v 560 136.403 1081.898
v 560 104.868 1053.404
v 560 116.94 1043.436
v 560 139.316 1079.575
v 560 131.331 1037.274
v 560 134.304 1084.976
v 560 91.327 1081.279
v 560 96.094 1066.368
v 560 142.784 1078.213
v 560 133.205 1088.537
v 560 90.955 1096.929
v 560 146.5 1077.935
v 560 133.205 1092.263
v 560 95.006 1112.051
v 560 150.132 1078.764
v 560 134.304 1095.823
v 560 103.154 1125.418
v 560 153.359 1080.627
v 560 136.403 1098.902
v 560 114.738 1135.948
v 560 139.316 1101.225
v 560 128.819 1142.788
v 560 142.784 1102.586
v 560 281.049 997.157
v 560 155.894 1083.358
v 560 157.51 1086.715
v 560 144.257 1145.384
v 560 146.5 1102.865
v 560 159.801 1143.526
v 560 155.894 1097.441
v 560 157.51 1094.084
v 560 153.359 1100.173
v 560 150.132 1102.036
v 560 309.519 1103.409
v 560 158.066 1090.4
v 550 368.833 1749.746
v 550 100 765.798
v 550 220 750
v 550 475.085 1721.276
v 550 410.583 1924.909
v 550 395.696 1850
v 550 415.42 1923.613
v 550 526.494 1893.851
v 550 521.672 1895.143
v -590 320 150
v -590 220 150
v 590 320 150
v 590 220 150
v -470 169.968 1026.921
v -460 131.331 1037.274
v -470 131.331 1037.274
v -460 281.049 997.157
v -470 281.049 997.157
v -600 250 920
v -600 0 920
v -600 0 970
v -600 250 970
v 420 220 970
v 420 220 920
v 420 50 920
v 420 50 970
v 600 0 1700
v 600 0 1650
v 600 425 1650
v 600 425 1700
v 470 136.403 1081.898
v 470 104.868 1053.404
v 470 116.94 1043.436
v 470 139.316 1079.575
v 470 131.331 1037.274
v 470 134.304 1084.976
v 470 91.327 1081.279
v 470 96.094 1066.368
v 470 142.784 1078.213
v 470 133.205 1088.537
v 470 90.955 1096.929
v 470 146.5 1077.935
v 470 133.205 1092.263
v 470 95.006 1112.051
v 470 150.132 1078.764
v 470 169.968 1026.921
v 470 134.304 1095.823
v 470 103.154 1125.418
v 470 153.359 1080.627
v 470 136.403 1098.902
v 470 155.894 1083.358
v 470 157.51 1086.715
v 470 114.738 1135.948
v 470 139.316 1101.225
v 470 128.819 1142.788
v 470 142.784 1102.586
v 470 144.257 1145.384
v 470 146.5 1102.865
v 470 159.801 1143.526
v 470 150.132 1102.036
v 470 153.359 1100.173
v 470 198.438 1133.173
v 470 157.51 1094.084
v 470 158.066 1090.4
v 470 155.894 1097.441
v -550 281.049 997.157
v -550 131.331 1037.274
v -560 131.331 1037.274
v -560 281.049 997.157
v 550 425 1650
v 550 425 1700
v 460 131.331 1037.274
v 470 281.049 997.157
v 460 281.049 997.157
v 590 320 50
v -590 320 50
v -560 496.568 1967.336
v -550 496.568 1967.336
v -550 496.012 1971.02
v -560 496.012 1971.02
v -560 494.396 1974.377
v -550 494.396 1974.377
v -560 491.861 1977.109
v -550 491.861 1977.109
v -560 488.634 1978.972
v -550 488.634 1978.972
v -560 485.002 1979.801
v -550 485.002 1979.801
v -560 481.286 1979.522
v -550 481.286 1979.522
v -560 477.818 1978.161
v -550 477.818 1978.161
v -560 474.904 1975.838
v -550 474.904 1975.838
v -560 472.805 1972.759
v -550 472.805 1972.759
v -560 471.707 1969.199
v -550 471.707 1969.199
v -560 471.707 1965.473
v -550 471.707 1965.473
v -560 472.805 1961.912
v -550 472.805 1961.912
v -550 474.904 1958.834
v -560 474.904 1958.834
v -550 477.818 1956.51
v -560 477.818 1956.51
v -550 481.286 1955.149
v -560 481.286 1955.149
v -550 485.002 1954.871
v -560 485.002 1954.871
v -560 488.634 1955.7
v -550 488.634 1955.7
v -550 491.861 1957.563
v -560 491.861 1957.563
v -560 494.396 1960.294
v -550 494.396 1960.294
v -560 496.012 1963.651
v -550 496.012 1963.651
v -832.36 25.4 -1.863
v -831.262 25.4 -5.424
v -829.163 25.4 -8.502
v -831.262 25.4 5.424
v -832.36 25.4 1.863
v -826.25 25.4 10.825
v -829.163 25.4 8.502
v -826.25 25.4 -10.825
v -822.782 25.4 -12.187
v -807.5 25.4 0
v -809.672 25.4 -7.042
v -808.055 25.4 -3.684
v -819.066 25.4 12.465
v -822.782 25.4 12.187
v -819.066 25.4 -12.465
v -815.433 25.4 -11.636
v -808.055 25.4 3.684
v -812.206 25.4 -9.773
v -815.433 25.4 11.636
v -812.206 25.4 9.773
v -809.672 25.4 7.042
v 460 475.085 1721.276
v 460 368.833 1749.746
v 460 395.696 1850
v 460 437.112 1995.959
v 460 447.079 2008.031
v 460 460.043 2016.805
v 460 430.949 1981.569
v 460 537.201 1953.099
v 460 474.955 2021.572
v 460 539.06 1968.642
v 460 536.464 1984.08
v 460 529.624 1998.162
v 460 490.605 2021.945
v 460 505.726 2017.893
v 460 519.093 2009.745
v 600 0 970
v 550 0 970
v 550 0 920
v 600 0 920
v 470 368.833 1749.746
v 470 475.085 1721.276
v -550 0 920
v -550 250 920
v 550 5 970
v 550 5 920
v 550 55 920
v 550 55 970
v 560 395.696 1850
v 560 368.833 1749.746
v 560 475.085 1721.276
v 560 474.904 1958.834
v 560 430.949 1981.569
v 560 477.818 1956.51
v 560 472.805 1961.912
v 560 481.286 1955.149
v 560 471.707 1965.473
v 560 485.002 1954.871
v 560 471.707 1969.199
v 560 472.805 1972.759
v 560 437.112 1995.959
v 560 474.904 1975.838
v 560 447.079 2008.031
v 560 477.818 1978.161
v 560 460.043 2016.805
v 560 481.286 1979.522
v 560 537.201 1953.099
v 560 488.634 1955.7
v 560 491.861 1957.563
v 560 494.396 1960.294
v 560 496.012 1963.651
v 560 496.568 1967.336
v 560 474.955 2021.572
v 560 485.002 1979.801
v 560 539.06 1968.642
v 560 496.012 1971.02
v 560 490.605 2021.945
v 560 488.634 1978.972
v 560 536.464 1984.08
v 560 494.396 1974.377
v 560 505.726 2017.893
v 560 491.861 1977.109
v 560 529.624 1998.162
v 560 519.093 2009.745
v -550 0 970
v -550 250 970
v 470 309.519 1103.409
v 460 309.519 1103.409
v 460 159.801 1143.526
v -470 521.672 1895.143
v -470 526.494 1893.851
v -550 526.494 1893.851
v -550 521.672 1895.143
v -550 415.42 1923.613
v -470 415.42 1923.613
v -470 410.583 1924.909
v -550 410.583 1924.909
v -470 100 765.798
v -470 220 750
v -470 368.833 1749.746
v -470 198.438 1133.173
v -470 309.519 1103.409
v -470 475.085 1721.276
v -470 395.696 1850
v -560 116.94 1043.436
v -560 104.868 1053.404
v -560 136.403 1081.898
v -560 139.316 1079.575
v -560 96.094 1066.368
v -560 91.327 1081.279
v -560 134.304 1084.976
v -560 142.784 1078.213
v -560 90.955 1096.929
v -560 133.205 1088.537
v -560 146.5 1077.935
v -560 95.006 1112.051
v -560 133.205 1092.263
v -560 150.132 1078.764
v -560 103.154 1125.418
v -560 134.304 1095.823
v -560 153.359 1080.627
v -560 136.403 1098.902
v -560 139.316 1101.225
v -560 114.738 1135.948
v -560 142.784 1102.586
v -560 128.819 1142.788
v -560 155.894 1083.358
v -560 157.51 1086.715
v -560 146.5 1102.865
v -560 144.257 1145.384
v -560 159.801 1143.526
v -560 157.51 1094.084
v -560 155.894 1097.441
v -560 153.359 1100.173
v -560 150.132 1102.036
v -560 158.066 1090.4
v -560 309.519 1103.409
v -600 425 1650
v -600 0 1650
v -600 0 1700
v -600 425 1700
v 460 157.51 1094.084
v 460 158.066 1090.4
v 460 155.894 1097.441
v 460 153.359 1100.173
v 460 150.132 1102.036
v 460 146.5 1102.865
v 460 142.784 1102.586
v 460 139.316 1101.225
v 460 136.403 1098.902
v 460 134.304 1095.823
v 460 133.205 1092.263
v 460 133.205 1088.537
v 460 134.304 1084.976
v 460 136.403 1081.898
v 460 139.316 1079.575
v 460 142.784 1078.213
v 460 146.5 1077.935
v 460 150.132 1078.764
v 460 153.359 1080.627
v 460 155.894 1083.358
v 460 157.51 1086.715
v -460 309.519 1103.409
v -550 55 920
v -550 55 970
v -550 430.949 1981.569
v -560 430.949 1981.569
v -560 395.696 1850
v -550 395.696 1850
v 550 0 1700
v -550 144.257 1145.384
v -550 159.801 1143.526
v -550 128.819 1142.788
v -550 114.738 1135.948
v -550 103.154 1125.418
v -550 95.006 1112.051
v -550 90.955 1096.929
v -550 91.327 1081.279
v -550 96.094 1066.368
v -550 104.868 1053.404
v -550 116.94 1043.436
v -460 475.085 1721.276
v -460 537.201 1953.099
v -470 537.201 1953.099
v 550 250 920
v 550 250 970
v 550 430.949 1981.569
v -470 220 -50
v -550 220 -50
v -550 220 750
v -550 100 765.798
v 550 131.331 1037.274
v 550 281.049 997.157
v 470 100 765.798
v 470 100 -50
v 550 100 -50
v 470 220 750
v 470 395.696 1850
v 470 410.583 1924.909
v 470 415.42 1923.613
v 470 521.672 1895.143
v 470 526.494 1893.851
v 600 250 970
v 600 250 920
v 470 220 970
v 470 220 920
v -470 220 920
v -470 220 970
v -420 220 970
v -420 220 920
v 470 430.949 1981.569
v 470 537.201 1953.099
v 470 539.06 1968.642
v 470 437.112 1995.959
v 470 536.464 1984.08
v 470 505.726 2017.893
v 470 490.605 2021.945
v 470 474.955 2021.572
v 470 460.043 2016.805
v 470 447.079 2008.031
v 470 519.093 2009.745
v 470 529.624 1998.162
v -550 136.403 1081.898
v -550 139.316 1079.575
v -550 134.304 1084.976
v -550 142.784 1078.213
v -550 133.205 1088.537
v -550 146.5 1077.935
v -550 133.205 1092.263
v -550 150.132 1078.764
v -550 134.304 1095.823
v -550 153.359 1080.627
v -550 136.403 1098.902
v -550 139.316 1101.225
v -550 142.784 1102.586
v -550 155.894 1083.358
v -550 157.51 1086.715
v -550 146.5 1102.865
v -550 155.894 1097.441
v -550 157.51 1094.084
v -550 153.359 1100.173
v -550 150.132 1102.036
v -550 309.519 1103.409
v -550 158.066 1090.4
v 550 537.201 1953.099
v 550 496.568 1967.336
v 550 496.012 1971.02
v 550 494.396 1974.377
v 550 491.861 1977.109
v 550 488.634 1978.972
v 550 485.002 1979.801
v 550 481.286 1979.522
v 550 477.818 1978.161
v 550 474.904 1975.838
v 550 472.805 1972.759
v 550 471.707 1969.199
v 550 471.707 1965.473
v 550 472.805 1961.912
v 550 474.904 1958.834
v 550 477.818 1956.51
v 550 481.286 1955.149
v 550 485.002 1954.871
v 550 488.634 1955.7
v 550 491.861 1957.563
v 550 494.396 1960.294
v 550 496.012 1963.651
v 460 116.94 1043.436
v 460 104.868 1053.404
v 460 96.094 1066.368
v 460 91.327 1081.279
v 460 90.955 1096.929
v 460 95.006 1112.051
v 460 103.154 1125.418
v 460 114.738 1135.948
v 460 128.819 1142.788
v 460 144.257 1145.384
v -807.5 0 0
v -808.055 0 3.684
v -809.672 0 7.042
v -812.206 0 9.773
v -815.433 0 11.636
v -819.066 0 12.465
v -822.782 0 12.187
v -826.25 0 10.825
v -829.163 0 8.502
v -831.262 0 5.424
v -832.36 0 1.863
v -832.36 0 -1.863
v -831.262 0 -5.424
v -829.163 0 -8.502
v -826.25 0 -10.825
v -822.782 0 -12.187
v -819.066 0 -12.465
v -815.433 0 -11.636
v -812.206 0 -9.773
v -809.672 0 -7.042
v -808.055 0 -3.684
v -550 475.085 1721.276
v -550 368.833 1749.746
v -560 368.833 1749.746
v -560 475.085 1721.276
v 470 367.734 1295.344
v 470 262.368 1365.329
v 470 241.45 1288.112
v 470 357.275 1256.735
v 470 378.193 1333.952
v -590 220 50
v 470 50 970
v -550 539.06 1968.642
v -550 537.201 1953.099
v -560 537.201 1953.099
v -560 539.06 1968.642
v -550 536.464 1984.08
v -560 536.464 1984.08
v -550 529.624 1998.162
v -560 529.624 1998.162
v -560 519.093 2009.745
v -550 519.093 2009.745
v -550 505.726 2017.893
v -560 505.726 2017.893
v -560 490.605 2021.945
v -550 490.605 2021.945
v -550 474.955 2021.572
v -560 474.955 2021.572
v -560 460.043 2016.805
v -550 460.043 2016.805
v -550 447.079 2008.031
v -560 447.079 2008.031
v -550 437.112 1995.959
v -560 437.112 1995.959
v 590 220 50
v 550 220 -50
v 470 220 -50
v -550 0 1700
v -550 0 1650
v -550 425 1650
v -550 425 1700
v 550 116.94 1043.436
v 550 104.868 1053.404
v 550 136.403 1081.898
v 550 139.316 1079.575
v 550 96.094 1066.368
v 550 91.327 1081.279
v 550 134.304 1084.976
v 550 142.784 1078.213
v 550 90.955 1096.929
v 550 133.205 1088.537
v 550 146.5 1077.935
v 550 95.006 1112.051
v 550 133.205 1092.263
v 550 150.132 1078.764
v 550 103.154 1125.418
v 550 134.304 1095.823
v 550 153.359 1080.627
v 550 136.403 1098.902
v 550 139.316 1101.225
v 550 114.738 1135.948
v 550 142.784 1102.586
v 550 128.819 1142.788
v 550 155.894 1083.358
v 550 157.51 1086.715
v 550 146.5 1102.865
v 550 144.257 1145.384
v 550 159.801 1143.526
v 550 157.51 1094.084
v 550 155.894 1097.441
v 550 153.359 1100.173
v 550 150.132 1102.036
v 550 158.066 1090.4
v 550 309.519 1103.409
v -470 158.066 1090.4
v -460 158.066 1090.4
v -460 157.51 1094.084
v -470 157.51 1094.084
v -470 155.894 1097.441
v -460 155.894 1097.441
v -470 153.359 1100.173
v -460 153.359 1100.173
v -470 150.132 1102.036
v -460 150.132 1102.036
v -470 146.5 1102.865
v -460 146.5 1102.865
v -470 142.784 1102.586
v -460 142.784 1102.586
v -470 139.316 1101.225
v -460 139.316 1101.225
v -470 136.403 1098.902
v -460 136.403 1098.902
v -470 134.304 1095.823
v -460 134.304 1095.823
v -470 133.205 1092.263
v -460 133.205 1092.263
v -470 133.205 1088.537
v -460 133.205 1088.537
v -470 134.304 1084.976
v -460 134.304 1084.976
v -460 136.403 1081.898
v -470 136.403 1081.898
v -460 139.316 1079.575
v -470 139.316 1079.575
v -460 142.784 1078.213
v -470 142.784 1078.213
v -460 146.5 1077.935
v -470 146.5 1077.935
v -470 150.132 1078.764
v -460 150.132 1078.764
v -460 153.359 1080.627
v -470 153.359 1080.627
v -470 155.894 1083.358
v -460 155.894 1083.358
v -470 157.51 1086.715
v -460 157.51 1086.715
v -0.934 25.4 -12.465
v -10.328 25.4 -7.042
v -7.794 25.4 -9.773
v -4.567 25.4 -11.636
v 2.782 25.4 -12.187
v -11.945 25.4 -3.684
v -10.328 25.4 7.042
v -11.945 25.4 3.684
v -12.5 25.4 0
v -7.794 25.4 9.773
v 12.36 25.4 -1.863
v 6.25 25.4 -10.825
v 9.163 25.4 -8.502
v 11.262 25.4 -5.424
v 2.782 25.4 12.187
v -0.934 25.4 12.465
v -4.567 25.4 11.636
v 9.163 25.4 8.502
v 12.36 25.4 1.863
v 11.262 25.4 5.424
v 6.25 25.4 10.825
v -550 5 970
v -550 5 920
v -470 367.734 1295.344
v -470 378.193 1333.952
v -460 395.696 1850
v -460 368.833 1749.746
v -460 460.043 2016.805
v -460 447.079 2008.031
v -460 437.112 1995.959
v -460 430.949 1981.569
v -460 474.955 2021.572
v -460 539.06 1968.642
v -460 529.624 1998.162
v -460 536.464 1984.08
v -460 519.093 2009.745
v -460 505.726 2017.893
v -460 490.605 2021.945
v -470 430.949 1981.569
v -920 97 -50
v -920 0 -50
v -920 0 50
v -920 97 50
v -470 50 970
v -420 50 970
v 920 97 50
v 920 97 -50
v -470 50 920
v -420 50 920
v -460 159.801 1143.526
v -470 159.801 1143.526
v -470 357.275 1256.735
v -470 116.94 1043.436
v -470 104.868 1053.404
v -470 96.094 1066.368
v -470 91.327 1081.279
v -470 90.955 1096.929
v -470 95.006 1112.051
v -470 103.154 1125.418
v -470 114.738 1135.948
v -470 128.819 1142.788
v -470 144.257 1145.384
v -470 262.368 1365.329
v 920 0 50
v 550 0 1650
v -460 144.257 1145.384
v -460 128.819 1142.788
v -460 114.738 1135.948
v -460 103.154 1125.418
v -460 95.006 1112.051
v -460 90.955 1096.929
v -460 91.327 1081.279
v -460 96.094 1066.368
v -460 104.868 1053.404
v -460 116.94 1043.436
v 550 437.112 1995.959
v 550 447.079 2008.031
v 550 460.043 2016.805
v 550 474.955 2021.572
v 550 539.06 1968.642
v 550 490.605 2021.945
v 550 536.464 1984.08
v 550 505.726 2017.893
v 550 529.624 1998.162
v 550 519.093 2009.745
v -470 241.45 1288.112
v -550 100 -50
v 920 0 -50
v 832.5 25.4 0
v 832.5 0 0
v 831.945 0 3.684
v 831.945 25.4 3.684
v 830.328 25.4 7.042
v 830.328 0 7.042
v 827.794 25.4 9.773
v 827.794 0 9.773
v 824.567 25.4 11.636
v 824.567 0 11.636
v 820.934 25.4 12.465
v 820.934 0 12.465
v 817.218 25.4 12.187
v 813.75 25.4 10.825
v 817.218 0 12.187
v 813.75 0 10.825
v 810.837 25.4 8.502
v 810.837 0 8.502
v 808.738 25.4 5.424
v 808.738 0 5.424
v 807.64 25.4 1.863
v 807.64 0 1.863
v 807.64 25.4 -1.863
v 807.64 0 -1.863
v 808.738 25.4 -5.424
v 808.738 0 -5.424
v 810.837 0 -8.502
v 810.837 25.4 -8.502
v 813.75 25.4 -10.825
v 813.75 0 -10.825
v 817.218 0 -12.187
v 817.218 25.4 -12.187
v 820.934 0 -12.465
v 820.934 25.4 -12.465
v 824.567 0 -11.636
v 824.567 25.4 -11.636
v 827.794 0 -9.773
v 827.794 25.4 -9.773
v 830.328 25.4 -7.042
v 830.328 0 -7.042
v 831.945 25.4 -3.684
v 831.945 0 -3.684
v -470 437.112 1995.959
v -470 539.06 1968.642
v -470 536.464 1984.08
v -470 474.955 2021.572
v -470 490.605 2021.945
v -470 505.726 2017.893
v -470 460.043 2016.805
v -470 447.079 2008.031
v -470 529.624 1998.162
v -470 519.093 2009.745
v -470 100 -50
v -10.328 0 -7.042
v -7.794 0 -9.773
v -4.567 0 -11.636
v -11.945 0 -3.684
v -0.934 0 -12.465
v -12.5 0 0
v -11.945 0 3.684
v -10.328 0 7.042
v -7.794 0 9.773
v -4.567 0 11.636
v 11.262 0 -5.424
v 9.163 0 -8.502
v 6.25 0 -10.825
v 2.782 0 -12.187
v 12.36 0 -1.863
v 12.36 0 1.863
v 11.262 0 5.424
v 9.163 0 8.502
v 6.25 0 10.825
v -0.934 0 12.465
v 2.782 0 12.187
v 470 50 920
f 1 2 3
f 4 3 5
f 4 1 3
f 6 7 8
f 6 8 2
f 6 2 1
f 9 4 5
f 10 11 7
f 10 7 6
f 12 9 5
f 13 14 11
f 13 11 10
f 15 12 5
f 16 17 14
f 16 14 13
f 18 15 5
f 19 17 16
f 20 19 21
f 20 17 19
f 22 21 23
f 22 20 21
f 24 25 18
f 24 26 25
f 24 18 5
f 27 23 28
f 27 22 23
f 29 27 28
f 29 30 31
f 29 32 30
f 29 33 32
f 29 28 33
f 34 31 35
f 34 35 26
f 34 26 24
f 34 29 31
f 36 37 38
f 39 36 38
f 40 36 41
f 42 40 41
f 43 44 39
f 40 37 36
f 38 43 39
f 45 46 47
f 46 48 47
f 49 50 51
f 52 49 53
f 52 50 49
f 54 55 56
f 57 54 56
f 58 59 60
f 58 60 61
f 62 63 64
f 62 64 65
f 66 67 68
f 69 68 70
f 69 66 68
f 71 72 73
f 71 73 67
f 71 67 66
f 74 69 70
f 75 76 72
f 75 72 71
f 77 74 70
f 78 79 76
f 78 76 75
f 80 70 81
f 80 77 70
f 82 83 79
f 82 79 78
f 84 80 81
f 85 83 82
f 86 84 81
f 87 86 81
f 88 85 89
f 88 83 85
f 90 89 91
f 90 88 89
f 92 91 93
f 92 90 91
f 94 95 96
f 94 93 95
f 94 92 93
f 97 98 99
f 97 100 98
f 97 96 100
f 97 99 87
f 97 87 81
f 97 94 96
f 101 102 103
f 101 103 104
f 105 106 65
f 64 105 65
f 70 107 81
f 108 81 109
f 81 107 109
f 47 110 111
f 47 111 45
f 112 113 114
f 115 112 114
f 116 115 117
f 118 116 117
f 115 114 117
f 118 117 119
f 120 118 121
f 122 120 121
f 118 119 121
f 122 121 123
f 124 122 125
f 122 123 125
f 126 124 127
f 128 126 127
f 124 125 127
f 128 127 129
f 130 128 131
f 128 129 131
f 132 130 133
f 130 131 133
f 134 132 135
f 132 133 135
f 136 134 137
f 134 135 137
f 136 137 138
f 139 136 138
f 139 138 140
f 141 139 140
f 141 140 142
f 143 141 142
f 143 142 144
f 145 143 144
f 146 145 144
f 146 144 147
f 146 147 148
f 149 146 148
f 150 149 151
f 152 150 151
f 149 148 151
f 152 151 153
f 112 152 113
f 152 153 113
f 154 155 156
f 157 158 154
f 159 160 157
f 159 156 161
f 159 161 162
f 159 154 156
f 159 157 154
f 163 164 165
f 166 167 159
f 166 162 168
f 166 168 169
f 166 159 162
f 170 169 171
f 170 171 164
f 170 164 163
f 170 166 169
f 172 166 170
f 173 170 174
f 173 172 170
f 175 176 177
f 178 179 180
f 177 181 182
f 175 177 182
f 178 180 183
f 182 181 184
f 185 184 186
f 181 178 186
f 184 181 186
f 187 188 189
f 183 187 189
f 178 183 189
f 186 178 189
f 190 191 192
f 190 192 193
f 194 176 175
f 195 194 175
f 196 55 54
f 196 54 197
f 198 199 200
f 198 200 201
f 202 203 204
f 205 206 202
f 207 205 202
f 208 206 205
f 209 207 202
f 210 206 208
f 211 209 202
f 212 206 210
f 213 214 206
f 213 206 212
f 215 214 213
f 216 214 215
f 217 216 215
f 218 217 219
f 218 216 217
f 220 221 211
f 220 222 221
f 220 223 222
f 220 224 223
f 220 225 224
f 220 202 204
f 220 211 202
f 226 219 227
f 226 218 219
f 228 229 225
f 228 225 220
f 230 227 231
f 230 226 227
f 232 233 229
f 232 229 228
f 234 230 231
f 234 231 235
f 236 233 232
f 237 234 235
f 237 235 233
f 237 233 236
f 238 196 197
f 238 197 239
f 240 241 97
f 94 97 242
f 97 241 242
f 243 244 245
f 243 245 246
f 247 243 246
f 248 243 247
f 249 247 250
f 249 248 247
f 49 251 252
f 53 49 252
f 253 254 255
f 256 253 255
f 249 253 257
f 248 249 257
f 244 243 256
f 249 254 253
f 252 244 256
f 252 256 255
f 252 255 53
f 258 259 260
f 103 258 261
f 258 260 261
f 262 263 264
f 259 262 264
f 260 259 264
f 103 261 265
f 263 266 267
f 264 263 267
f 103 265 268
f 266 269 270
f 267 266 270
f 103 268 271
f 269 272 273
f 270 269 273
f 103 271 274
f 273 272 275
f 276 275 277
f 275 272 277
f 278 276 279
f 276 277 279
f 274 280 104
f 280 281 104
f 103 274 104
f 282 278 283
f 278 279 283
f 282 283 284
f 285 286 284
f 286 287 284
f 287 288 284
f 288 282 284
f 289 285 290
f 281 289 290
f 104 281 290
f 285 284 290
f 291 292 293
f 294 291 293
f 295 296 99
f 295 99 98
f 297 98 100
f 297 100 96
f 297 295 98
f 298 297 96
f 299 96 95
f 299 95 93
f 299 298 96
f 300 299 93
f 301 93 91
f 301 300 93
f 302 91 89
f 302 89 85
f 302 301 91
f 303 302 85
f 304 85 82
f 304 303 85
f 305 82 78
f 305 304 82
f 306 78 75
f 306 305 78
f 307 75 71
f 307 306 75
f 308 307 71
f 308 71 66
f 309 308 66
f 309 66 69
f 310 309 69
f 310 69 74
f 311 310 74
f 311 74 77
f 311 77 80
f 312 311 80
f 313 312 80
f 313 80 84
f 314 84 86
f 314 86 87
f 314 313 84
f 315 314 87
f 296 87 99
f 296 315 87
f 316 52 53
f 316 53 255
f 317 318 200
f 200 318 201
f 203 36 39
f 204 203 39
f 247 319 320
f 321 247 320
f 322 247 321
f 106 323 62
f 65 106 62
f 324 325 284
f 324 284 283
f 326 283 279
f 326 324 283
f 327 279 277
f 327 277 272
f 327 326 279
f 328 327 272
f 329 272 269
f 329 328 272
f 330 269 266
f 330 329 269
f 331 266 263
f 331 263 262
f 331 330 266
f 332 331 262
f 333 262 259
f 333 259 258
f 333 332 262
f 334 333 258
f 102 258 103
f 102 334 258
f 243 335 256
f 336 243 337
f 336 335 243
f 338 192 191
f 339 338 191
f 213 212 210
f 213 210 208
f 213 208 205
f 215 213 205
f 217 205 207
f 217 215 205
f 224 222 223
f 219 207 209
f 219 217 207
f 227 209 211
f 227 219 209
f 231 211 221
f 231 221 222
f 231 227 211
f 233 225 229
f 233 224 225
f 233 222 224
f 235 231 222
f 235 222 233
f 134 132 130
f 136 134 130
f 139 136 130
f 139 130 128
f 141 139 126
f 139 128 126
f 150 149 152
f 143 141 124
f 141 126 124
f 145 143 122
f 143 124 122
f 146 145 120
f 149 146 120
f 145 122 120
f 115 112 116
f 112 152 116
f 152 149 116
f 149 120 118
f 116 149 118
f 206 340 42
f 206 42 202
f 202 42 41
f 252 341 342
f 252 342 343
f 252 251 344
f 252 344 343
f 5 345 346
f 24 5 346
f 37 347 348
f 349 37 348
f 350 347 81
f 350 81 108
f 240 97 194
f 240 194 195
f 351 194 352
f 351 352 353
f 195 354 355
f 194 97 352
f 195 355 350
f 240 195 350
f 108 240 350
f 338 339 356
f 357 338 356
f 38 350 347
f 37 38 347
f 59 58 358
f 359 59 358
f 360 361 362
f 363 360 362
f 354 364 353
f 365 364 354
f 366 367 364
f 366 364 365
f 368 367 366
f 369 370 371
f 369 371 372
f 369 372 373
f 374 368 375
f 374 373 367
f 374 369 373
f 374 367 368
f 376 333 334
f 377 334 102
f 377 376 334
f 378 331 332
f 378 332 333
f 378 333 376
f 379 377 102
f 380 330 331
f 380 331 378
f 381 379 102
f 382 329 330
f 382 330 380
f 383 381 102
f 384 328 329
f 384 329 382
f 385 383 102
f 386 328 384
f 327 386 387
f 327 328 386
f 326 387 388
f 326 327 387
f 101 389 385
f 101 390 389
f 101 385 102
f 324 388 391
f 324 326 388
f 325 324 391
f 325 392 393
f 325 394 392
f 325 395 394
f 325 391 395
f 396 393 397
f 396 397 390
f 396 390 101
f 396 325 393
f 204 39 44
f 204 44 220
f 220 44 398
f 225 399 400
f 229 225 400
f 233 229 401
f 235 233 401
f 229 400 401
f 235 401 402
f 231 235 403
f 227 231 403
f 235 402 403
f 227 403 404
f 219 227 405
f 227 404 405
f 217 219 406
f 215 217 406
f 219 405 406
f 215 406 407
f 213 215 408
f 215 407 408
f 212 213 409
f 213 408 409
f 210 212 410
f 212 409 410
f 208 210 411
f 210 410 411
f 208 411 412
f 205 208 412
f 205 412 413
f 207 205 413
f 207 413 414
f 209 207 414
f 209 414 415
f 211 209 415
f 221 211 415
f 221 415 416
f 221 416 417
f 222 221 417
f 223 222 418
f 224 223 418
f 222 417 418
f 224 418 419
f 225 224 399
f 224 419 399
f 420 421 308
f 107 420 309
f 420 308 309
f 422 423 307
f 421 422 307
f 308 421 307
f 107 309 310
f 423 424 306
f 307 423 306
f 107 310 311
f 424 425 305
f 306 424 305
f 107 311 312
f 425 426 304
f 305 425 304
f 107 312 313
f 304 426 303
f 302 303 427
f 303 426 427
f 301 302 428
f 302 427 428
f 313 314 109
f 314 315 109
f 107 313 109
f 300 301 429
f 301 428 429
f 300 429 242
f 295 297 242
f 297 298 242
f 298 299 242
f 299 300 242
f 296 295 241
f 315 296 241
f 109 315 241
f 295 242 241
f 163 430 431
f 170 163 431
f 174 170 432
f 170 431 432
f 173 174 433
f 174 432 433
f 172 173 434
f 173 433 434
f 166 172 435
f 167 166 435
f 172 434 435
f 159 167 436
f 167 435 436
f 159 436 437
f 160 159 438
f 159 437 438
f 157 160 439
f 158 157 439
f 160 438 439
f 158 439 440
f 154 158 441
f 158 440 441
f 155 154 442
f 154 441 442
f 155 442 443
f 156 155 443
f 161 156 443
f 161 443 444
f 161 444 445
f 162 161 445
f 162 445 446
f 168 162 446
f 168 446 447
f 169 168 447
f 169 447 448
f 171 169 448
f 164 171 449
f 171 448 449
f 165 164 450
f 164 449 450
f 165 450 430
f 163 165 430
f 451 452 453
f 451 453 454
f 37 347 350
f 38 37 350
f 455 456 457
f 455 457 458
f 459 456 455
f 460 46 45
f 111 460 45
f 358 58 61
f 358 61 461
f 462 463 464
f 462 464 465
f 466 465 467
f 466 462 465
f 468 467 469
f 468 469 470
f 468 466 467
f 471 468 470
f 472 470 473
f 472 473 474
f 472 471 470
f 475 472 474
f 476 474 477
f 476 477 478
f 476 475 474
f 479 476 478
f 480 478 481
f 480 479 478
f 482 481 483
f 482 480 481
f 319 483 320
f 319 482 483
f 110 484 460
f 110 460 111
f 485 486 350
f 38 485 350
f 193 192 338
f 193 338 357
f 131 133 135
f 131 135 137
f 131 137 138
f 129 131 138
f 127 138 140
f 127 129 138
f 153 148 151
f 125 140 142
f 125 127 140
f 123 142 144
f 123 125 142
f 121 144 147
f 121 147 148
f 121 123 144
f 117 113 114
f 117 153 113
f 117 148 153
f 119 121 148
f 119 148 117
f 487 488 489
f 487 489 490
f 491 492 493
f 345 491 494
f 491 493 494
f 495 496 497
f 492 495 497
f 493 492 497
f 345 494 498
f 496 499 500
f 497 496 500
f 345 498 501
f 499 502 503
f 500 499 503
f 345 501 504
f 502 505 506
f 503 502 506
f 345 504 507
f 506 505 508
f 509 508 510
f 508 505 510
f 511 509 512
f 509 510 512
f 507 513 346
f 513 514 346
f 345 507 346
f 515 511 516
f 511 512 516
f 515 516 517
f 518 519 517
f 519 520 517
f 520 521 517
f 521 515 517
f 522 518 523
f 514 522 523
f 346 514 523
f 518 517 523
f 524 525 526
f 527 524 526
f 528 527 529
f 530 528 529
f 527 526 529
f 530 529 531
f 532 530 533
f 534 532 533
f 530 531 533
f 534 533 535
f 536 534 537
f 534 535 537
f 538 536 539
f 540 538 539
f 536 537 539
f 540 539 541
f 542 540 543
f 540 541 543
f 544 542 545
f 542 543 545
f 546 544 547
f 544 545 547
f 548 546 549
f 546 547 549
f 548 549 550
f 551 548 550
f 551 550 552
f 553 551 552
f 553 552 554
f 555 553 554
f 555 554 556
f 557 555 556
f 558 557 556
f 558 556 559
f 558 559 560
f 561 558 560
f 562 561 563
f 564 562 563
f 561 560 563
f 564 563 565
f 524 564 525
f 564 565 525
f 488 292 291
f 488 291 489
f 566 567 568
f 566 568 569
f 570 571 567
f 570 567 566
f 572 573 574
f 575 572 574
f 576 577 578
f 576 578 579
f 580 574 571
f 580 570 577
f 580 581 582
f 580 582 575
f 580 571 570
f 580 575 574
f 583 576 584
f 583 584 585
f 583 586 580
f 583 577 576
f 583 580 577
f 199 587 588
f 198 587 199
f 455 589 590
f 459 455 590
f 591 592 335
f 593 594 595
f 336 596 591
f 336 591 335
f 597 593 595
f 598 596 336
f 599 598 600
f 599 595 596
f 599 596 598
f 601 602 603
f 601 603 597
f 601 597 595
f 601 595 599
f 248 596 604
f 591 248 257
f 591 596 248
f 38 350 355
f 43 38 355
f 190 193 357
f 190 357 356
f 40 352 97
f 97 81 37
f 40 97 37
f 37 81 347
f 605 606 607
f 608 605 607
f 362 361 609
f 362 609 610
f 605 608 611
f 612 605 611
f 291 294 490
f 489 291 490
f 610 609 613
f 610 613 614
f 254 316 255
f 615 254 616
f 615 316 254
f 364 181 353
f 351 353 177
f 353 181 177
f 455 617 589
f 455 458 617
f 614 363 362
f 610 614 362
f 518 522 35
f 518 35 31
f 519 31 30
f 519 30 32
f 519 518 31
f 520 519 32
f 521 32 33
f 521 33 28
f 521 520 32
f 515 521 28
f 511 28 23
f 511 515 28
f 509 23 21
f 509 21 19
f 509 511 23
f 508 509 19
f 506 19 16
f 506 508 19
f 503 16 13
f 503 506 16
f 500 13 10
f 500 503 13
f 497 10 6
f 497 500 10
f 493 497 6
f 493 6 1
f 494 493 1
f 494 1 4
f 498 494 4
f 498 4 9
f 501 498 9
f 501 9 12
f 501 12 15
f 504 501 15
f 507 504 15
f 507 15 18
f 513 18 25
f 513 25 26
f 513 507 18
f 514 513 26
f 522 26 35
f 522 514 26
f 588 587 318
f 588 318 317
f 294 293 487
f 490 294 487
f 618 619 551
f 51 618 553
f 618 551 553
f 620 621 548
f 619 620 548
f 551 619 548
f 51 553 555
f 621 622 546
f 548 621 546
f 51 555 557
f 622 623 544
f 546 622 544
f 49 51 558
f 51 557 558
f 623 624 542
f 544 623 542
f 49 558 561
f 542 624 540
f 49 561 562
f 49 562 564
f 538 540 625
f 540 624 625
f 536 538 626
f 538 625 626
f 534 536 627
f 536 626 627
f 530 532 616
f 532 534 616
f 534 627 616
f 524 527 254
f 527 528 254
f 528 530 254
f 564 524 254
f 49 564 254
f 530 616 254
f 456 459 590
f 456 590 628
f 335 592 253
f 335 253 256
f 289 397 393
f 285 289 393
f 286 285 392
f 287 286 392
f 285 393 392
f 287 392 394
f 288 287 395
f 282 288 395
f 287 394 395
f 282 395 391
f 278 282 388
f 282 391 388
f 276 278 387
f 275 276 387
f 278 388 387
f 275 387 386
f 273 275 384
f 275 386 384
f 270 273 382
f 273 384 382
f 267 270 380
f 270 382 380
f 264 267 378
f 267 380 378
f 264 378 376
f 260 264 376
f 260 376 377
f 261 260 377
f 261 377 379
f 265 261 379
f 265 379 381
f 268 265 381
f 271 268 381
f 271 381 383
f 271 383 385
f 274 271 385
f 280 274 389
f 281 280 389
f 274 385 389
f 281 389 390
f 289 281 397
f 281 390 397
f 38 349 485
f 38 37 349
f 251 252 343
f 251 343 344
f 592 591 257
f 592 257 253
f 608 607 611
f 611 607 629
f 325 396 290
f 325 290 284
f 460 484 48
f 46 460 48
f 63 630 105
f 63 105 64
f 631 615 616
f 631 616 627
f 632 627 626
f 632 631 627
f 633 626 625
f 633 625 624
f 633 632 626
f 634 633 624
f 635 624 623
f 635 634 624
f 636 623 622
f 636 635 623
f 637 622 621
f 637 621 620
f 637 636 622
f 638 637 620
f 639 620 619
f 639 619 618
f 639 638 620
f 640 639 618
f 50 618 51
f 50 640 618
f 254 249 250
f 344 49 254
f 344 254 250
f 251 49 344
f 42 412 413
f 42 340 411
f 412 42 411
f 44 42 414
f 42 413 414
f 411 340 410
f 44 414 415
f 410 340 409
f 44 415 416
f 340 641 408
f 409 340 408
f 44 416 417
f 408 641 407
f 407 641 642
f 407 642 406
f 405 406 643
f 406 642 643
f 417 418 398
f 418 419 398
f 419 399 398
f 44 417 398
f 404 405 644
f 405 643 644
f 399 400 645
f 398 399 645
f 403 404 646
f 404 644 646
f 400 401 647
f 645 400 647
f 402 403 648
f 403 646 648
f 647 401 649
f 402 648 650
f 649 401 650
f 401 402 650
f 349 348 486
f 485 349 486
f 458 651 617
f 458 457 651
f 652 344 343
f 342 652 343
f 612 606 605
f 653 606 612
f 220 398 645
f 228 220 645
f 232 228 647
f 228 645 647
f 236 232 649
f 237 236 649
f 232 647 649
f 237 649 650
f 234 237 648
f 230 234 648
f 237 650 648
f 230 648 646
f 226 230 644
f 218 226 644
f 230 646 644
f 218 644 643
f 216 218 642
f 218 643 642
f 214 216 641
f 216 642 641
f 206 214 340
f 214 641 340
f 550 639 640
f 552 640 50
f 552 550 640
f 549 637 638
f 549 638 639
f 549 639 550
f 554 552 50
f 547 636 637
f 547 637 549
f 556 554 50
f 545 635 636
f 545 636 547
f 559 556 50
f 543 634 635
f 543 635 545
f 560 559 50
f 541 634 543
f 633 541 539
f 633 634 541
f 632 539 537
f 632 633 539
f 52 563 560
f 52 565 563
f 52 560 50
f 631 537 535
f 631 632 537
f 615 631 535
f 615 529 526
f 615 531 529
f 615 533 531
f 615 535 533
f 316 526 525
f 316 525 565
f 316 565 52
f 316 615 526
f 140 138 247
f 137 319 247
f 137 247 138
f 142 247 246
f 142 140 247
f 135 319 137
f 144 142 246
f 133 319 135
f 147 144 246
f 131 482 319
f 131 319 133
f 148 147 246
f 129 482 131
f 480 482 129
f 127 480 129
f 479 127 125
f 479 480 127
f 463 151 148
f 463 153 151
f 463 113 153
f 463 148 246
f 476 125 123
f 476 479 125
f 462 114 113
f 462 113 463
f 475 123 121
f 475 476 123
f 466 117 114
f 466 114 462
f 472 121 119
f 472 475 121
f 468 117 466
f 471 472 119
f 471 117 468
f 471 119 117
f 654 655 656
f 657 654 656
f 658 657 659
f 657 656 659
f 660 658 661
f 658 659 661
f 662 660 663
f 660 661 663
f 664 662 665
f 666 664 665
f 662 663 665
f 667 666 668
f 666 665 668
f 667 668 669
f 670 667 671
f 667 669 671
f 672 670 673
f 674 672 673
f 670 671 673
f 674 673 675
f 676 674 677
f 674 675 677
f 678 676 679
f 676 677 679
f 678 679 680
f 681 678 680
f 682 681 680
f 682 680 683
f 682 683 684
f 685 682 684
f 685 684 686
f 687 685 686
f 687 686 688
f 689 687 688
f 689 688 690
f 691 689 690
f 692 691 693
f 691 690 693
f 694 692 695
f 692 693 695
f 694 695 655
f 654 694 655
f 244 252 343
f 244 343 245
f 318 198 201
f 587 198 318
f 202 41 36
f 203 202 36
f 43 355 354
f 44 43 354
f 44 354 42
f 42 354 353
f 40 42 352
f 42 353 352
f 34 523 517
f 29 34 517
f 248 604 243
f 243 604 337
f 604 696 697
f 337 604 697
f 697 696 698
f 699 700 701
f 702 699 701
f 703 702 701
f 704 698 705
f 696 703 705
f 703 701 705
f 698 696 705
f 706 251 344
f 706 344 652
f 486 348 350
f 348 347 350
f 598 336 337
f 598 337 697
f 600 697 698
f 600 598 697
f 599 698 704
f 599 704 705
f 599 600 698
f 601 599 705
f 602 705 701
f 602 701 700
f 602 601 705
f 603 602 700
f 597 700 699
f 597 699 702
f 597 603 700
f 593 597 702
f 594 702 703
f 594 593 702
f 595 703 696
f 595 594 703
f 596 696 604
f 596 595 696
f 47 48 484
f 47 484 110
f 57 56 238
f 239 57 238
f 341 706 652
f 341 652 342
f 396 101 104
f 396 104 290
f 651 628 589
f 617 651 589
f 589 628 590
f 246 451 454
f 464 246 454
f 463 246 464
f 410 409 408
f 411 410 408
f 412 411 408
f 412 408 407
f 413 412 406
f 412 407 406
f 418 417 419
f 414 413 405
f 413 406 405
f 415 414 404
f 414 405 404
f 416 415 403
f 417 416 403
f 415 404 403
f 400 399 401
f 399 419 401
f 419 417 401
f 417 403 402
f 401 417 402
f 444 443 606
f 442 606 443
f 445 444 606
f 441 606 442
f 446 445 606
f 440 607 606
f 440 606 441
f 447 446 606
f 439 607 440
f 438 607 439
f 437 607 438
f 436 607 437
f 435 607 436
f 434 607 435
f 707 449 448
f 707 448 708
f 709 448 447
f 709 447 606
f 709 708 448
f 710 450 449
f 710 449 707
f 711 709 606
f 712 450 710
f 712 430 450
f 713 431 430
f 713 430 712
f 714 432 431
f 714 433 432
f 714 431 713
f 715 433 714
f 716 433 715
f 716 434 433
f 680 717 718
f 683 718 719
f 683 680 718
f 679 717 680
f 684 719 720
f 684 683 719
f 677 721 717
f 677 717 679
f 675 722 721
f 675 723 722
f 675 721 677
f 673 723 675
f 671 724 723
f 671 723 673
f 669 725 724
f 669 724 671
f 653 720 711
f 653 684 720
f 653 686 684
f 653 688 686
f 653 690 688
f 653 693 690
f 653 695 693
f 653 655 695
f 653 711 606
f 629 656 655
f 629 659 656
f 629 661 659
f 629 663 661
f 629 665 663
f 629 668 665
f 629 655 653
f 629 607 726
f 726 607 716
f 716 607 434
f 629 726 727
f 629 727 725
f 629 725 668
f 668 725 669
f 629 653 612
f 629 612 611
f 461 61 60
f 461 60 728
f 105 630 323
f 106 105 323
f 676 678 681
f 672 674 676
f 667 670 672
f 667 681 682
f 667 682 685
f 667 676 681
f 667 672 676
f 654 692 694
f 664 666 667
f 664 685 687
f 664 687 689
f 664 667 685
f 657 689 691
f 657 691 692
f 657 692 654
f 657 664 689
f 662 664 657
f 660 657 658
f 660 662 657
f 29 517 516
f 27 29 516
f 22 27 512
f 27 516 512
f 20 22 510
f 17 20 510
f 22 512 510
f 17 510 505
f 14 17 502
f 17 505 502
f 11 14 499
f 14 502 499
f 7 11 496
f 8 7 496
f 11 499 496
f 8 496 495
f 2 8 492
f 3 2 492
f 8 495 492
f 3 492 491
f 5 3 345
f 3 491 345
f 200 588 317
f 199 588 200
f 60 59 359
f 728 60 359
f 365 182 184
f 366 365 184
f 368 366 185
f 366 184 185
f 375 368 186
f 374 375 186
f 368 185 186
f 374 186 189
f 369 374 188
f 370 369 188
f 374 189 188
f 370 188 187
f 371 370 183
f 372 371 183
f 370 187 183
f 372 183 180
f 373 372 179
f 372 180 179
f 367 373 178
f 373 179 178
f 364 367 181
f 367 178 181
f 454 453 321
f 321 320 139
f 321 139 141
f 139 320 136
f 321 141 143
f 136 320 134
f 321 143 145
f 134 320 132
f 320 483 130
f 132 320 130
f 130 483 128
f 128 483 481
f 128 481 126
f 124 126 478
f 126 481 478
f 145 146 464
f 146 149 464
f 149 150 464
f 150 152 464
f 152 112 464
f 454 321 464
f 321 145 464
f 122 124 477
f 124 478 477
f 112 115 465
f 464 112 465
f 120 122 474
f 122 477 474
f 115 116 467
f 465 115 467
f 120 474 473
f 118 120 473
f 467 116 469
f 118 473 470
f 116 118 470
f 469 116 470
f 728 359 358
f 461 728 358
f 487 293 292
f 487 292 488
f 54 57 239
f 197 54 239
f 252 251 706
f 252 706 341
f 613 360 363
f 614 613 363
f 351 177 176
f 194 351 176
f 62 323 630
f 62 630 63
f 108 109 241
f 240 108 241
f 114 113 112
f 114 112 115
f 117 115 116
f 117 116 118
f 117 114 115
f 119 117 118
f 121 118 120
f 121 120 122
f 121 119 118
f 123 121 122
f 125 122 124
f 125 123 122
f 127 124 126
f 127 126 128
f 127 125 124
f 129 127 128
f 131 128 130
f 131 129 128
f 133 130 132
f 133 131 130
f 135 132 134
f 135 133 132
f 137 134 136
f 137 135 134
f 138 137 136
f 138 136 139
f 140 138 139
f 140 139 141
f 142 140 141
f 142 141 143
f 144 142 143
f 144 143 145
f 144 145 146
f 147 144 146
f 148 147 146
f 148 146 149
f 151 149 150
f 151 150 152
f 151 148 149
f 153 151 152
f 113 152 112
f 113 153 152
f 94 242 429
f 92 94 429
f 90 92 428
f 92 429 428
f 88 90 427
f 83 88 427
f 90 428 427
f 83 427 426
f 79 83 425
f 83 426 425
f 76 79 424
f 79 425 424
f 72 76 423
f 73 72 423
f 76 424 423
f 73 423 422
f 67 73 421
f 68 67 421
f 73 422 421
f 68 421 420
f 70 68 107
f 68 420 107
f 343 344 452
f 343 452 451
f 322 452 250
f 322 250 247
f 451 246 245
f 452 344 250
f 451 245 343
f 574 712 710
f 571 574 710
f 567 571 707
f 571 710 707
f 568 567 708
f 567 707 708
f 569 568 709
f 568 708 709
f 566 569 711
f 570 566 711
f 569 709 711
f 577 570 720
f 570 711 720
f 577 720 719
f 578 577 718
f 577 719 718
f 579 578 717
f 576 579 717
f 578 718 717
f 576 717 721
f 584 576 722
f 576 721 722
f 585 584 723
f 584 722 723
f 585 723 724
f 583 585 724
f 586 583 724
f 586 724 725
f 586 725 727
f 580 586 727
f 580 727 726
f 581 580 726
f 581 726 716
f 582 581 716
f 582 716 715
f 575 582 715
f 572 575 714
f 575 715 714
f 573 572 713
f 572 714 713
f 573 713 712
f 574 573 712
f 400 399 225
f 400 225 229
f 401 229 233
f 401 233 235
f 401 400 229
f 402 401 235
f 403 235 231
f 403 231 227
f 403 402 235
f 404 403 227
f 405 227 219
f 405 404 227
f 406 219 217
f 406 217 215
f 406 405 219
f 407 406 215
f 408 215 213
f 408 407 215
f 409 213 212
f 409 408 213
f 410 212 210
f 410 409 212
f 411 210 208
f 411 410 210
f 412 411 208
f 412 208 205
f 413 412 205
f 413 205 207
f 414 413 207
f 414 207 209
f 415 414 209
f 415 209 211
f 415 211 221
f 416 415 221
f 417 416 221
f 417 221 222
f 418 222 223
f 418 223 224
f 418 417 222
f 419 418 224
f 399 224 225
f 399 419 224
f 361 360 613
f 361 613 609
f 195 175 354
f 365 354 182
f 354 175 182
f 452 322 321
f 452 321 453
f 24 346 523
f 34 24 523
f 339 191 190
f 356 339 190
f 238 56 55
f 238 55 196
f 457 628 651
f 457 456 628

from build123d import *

# Parameters (mm, degrees)
F0_W           = 1840
F0_H           = 100
F3_DEPTH       = 97
F4_START       = -5
F4_DEPTH       = 50
F5_R           = 12.5
F6_DEPTH       = 25.4
F7_W           = 50
F7_H           = 50
F8_DEPTH       = 250
F10_START      = -50
F9_W           = 50
F9_H           = 50
F10_DEPTH      = 170
F2_W           = 50
F2_H           = 50
F11_DEPTH      = 425
F13_START      = 470
F13_DEPTH      = 80
F15_START      = -470
F15_DEPTH      = 80
F17_START      = 470
F17_DEPTH      = 80
F18_START      = -470
F18_DEPTH      = 80
F20_START      = 550
F19_R          = 12.5
F20_DEPTH      = 10
F21_START      = 460
F21_DEPTH      = 10
F22_START      = -550
F22_DEPTH      = 10
F23_START      = -460
F23_DEPTH      = 10
F25_W          = 100
F25_H          = 100
F26_DEPTH      = 590
F26_DEPTH_BACK = 590
F27_START      = 550
F24_R          = 12.5
F27_DEPTH      = 10
F28_START      = 460
F28_DEPTH      = 10
F29_START      = -550
F29_DEPTH      = 10
F30_START      = -460
F30_DEPTH      = 10
F32_DEPTH      = 470
F32_DEPTH_BACK = 470


with BuildPart() as f3:
    # F0 (on Front) → F3 (new body)
    with BuildSketch(Plane.XZ):
        Rectangle(F0_W, F0_H)
    extrude(amount=-F3_DEPTH)

    # F5 (on Front) → F6 (cut)
    with BuildSketch(Plane.XZ):
        with Locations((-820, 0)):
            Circle(F5_R)
        with BuildLine():
            ThreePointArc((12.5, 0), (0, 12.5), (-12.5, 0))
            ThreePointArc((-12.5, 0), (0, -12.5), (12.5, 0))
        make_face()
        with Locations((820, 0)):
            Circle(F5_R)
    extrude(amount=-F6_DEPTH, mode=Mode.SUBTRACT)


with BuildPart() as f4:
    # F1 (on Front) → F4 (new body)
    with BuildSketch(Plane.XZ.offset(F4_START)):
        Polygon((550, 970), (-550, 970), (-550, 920), (0, 920), (550, 920), align=None)
    extrude(amount=-F4_DEPTH)


with BuildPart() as f8:
    # F7 (on Front) → F8 (new body)
    with BuildSketch(Plane.XZ):
        with Locations((-575, 945)):
            Rectangle(F7_W, F7_H)
    extrude(amount=-F8_DEPTH)


with BuildPart() as f8b:
    # F7 (on Front) → F8, piece 2 (new body)
    with BuildSketch(Plane.XZ):
        with Locations((575, 945)):
            Rectangle(F7_W, F7_H)
    extrude(amount=-F8_DEPTH)


with BuildPart() as f10:
    # F9 (on Front) → F10 (new body)
    with BuildSketch(Plane.XZ.offset(F10_START)):
        with Locations((-445, 945)):
            Rectangle(F9_W, F9_H)
    extrude(amount=-F10_DEPTH)


with BuildPart() as f10b:
    # F9 (on Front) → F10, piece 2 (new body)
    with BuildSketch(Plane.XZ.offset(F10_START)):
        with Locations((445, 945)):
            Rectangle(F9_W, F9_H)
    extrude(amount=-F10_DEPTH)


with BuildPart() as f11:
    # F2 (on Front) → F11 (new body)
    with BuildSketch(Plane.XZ):
        with Locations((-575, 1675)):
            Rectangle(F2_W, F2_H)
    extrude(amount=-F11_DEPTH)


with BuildPart() as f11b:
    # F2 (on Front) → F11, piece 2 (new body)
    with BuildSketch(Plane.XZ):
        with Locations((575, 1675)):
            Rectangle(F2_W, F2_H)
    extrude(amount=-F11_DEPTH)


with BuildPart() as f13:
    # F12 (on Right) → F13 (new body)
    with BuildSketch(Plane.YZ.offset(F13_START)):
        Polygon((100, 750), (100, 0), (100, -50), (220, -50), (220, 0), (220, 750), (100, 765.7982997105), align=None)
    extrude(amount=F13_DEPTH)


with BuildPart() as f15:
    # F14 (on Right) → F15 (new body)
    with BuildSketch(Plane.YZ.offset(F15_START)):
        Polygon((220, -50), (220, 0), (220, 750), (100, 765.7982997105), (100, 750), (100, 0), (100, -50), align=None)
    extrude(amount=-F15_DEPTH)


with BuildPart() as f17:
    # F16 (on Right) → F17 (new body)
    with BuildSketch(Plane.YZ.offset(F17_START)):
        Polygon((100, 765.7982997105), (220, 750), (526.4939532777, 1893.8510058451), (410.582854123, 1924.9092912574), align=None)
    extrude(amount=F17_DEPTH)

    # F19 (on Right) → F20 (join)
    with BuildSketch(Plane.YZ.offset(F20_START)):
        Polygon((475.0847018168, 1721.2763607837), (521.6721299352, 1895.1430095157), (415.4202890434, 1923.613104477), (395.6957171464, 1850), (368.832860925, 1749.746455745), align=None)
        with BuildLine():
            Line((415.4202890434, 1923.613104477), (521.6721299352, 1895.1430095157))
            Line((521.6721299352, 1895.1430095157), (537.2012726414, 1953.0985590931))
            ThreePointArc((537.2012726414, 1953.0985590931), (498.3103996761, 2020.4595270196), (430.9494317496, 1981.5686540544))
            Line((430.9494317496, 1981.5686540544), (415.4202890434, 1923.613104477))
        make_face()
        with Locations((484.0675464065, 1967.3356981286)):
            Circle(F19_R, mode=Mode.SUBTRACT)
    extrude(amount=F20_DEPTH)

    # F19 (on Right) → F21 (join)
    with BuildSketch(Plane.YZ.offset(F21_START)):
        Polygon((475.0847018168, 1721.2763607837), (521.6721299352, 1895.1430095157), (415.4202890434, 1923.613104477), (395.6957171464, 1850), (368.832860925, 1749.746455745), align=None)
        with BuildLine():
            Line((415.4202890434, 1923.613104477), (521.6721299352, 1895.1430095157))
            Line((521.6721299352, 1895.1430095157), (537.2012726414, 1953.0985590931))
            ThreePointArc((537.2012726414, 1953.0985590931), (498.3103996761, 2020.4595270196), (430.9494317496, 1981.5686540544))
            Line((430.9494317496, 1981.5686540544), (415.4202890434, 1923.613104477))
        make_face()
        with Locations((484.0675464065, 1967.3356981286)):
            Circle(F19_R, mode=Mode.SUBTRACT)
    extrude(amount=F21_DEPTH)

    # F24 (on Right) → F28 (join)
    with BuildSketch(Plane.YZ.offset(F28_START)):
        with Locations((484.0675464065, 1967.3356981286)):
            Circle(F24_R)
        with BuildLine():
            Line((131.330628284, 1037.2739285056), (169.9676613355, 1026.9211667015))
            Line((169.9676613355, 1026.9211667015), (198.4377562968, 1133.1730075933))
            Line((198.4377562968, 1133.1730075933), (159.8007232453, 1143.5257693974))
            ThreePointArc((159.8007232453, 1143.5257693974), (92.4397553187, 1104.6348964321), (131.330628284, 1037.2739285056))
        make_face()
        with Locations((145.5656757646, 1090.3998489515)):
            Circle(F24_R, mode=Mode.SUBTRACT)
        Polygon((198.4377562968, 1133.1730075933), (169.9676613355, 1026.9211667015), (281.0491313588, 997.1569765147), (309.5192263201, 1103.4088174065), align=None)
    extrude(amount=F28_DEPTH)


with BuildPart() as f18:
    # F16 (on Right) → F18 (new body)
    with BuildSketch(Plane.YZ.offset(F18_START)):
        Polygon((100, 765.7982997105), (220, 750), (526.4939532777, 1893.8510058451), (410.582854123, 1924.9092912574), align=None)
    extrude(amount=-F18_DEPTH)

    # F19 (on Right) → F22 (join)
    with BuildSketch(Plane.YZ.offset(F22_START)):
        Polygon((475.0847018168, 1721.2763607837), (521.6721299352, 1895.1430095157), (415.4202890434, 1923.613104477), (395.6957171464, 1850), (368.832860925, 1749.746455745), align=None)
        with BuildLine():
            Line((415.4202890434, 1923.613104477), (521.6721299352, 1895.1430095157))
            Line((521.6721299352, 1895.1430095157), (537.2012726414, 1953.0985590931))
            ThreePointArc((537.2012726414, 1953.0985590931), (498.3103996761, 2020.4595270196), (430.9494317496, 1981.5686540544))
            Line((430.9494317496, 1981.5686540544), (415.4202890434, 1923.613104477))
        make_face()
        with Locations((484.0675464065, 1967.3356981286)):
            Circle(F19_R, mode=Mode.SUBTRACT)
    extrude(amount=-F22_DEPTH)

    # F19 (on Right) → F23 (join)
    with BuildSketch(Plane.YZ.offset(F23_START)):
        Polygon((475.0847018168, 1721.2763607837), (521.6721299352, 1895.1430095157), (415.4202890434, 1923.613104477), (395.6957171464, 1850), (368.832860925, 1749.746455745), align=None)
        with BuildLine():
            Line((415.4202890434, 1923.613104477), (521.6721299352, 1895.1430095157))
            Line((521.6721299352, 1895.1430095157), (537.2012726414, 1953.0985590931))
            ThreePointArc((537.2012726414, 1953.0985590931), (498.3103996761, 2020.4595270196), (430.9494317496, 1981.5686540544))
            Line((430.9494317496, 1981.5686540544), (415.4202890434, 1923.613104477))
        make_face()
        with Locations((484.0675464065, 1967.3356981286)):
            Circle(F19_R, mode=Mode.SUBTRACT)
    extrude(amount=-F23_DEPTH)

    # F24 (on Right) → F30 (join)
    with BuildSketch(Plane.YZ.offset(F30_START)):
        with Locations((484.0675464065, 1967.3356981286)):
            Circle(F24_R)
        with BuildLine():
            Line((131.330628284, 1037.2739285056), (169.9676613355, 1026.9211667015))
            Line((169.9676613355, 1026.9211667015), (198.4377562968, 1133.1730075933))
            Line((198.4377562968, 1133.1730075933), (159.8007232453, 1143.5257693974))
            ThreePointArc((159.8007232453, 1143.5257693974), (92.4397553187, 1104.6348964321), (131.330628284, 1037.2739285056))
        make_face()
        with Locations((145.5656757646, 1090.3998489515)):
            Circle(F24_R, mode=Mode.SUBTRACT)
        Polygon((198.4377562968, 1133.1730075933), (169.9676613355, 1026.9211667015), (281.0491313588, 997.1569765147), (309.5192263201, 1103.4088174065), align=None)
    extrude(amount=-F30_DEPTH)


with BuildPart() as f26:
    # F25 (on Right) → F26 (new body, two sides)
    with BuildSketch(Plane.YZ) as f26_sk:
        with Locations((270, 100)):
            Rectangle(F25_W, F25_H)
    extrude(amount=F26_DEPTH)
    extrude(f26_sk.sketch, amount=-F26_DEPTH_BACK)


with BuildPart() as f27:
    # F24 (on Right) → F27 (new body)
    with BuildSketch(Plane.YZ.offset(F27_START)):
        with Locations((484.0675464065, 1967.3356981286)):
            Circle(F24_R)
    extrude(amount=F27_DEPTH)


with BuildPart() as f27b:
    # F24 (on Right) → F27, piece 2 (new body)
    with BuildSketch(Plane.YZ.offset(F27_START)):
        with BuildLine():
            Line((131.330628284, 1037.2739285056), (169.9676613355, 1026.9211667015))
            Line((169.9676613355, 1026.9211667015), (198.4377562968, 1133.1730075933))
            Line((198.4377562968, 1133.1730075933), (159.8007232453, 1143.5257693974))
            ThreePointArc((159.8007232453, 1143.5257693974), (92.4397553187, 1104.6348964321), (131.330628284, 1037.2739285056))
        make_face()
        with Locations((145.5656757646, 1090.3998489515)):
            Circle(F24_R, mode=Mode.SUBTRACT)
        Polygon((198.4377562968, 1133.1730075933), (169.9676613355, 1026.9211667015), (281.0491313588, 997.1569765147), (309.5192263201, 1103.4088174065), align=None)
    extrude(amount=F27_DEPTH)


with BuildPart() as f29:
    # F24 (on Right) → F29 (new body)
    with BuildSketch(Plane.YZ.offset(F29_START)):
        with Locations((484.0675464065, 1967.3356981286)):
            Circle(F24_R)
    extrude(amount=-F29_DEPTH)


with BuildPart() as f29b:
    # F24 (on Right) → F29, piece 2 (new body)
    with BuildSketch(Plane.YZ.offset(F29_START)):
        with BuildLine():
            Line((131.330628284, 1037.2739285056), (169.9676613355, 1026.9211667015))
            Line((169.9676613355, 1026.9211667015), (198.4377562968, 1133.1730075933))
            Line((198.4377562968, 1133.1730075933), (159.8007232453, 1143.5257693974))
            ThreePointArc((159.8007232453, 1143.5257693974), (92.4397553187, 1104.6348964321), (131.330628284, 1037.2739285056))
        make_face()
        with Locations((145.5656757646, 1090.3998489515)):
            Circle(F24_R, mode=Mode.SUBTRACT)
        Polygon((198.4377562968, 1133.1730075933), (169.9676613355, 1026.9211667015), (281.0491313588, 997.1569765147), (309.5192263201, 1103.4088174065), align=None)
    extrude(amount=-F29_DEPTH)


with BuildPart() as f32:
    # F31 (on Right) → F32 (new body, two sides)
    with BuildSketch(Plane.YZ) as f32_sk:
        Polygon((357.2753242756, 1256.7351234571), (367.7343966013, 1295.3435138157), (378.1934689271, 1333.9519041743), (262.3682978512, 1365.3291211516), (241.4501531997, 1288.1123404343), align=None)
    extrude(amount=F32_DEPTH)
    extrude(f32_sk.sketch, amount=-F32_DEPTH_BACK)


solid = Compound([f3.part, f4.part, f8.part, f8b.part, f10.part, f10b.part, f11.part, f11b.part, f13.part, f15.part, f17.part, f18.part, f26.part, f27.part, f27b.part, f29.part, f29b.part, f32.part])
